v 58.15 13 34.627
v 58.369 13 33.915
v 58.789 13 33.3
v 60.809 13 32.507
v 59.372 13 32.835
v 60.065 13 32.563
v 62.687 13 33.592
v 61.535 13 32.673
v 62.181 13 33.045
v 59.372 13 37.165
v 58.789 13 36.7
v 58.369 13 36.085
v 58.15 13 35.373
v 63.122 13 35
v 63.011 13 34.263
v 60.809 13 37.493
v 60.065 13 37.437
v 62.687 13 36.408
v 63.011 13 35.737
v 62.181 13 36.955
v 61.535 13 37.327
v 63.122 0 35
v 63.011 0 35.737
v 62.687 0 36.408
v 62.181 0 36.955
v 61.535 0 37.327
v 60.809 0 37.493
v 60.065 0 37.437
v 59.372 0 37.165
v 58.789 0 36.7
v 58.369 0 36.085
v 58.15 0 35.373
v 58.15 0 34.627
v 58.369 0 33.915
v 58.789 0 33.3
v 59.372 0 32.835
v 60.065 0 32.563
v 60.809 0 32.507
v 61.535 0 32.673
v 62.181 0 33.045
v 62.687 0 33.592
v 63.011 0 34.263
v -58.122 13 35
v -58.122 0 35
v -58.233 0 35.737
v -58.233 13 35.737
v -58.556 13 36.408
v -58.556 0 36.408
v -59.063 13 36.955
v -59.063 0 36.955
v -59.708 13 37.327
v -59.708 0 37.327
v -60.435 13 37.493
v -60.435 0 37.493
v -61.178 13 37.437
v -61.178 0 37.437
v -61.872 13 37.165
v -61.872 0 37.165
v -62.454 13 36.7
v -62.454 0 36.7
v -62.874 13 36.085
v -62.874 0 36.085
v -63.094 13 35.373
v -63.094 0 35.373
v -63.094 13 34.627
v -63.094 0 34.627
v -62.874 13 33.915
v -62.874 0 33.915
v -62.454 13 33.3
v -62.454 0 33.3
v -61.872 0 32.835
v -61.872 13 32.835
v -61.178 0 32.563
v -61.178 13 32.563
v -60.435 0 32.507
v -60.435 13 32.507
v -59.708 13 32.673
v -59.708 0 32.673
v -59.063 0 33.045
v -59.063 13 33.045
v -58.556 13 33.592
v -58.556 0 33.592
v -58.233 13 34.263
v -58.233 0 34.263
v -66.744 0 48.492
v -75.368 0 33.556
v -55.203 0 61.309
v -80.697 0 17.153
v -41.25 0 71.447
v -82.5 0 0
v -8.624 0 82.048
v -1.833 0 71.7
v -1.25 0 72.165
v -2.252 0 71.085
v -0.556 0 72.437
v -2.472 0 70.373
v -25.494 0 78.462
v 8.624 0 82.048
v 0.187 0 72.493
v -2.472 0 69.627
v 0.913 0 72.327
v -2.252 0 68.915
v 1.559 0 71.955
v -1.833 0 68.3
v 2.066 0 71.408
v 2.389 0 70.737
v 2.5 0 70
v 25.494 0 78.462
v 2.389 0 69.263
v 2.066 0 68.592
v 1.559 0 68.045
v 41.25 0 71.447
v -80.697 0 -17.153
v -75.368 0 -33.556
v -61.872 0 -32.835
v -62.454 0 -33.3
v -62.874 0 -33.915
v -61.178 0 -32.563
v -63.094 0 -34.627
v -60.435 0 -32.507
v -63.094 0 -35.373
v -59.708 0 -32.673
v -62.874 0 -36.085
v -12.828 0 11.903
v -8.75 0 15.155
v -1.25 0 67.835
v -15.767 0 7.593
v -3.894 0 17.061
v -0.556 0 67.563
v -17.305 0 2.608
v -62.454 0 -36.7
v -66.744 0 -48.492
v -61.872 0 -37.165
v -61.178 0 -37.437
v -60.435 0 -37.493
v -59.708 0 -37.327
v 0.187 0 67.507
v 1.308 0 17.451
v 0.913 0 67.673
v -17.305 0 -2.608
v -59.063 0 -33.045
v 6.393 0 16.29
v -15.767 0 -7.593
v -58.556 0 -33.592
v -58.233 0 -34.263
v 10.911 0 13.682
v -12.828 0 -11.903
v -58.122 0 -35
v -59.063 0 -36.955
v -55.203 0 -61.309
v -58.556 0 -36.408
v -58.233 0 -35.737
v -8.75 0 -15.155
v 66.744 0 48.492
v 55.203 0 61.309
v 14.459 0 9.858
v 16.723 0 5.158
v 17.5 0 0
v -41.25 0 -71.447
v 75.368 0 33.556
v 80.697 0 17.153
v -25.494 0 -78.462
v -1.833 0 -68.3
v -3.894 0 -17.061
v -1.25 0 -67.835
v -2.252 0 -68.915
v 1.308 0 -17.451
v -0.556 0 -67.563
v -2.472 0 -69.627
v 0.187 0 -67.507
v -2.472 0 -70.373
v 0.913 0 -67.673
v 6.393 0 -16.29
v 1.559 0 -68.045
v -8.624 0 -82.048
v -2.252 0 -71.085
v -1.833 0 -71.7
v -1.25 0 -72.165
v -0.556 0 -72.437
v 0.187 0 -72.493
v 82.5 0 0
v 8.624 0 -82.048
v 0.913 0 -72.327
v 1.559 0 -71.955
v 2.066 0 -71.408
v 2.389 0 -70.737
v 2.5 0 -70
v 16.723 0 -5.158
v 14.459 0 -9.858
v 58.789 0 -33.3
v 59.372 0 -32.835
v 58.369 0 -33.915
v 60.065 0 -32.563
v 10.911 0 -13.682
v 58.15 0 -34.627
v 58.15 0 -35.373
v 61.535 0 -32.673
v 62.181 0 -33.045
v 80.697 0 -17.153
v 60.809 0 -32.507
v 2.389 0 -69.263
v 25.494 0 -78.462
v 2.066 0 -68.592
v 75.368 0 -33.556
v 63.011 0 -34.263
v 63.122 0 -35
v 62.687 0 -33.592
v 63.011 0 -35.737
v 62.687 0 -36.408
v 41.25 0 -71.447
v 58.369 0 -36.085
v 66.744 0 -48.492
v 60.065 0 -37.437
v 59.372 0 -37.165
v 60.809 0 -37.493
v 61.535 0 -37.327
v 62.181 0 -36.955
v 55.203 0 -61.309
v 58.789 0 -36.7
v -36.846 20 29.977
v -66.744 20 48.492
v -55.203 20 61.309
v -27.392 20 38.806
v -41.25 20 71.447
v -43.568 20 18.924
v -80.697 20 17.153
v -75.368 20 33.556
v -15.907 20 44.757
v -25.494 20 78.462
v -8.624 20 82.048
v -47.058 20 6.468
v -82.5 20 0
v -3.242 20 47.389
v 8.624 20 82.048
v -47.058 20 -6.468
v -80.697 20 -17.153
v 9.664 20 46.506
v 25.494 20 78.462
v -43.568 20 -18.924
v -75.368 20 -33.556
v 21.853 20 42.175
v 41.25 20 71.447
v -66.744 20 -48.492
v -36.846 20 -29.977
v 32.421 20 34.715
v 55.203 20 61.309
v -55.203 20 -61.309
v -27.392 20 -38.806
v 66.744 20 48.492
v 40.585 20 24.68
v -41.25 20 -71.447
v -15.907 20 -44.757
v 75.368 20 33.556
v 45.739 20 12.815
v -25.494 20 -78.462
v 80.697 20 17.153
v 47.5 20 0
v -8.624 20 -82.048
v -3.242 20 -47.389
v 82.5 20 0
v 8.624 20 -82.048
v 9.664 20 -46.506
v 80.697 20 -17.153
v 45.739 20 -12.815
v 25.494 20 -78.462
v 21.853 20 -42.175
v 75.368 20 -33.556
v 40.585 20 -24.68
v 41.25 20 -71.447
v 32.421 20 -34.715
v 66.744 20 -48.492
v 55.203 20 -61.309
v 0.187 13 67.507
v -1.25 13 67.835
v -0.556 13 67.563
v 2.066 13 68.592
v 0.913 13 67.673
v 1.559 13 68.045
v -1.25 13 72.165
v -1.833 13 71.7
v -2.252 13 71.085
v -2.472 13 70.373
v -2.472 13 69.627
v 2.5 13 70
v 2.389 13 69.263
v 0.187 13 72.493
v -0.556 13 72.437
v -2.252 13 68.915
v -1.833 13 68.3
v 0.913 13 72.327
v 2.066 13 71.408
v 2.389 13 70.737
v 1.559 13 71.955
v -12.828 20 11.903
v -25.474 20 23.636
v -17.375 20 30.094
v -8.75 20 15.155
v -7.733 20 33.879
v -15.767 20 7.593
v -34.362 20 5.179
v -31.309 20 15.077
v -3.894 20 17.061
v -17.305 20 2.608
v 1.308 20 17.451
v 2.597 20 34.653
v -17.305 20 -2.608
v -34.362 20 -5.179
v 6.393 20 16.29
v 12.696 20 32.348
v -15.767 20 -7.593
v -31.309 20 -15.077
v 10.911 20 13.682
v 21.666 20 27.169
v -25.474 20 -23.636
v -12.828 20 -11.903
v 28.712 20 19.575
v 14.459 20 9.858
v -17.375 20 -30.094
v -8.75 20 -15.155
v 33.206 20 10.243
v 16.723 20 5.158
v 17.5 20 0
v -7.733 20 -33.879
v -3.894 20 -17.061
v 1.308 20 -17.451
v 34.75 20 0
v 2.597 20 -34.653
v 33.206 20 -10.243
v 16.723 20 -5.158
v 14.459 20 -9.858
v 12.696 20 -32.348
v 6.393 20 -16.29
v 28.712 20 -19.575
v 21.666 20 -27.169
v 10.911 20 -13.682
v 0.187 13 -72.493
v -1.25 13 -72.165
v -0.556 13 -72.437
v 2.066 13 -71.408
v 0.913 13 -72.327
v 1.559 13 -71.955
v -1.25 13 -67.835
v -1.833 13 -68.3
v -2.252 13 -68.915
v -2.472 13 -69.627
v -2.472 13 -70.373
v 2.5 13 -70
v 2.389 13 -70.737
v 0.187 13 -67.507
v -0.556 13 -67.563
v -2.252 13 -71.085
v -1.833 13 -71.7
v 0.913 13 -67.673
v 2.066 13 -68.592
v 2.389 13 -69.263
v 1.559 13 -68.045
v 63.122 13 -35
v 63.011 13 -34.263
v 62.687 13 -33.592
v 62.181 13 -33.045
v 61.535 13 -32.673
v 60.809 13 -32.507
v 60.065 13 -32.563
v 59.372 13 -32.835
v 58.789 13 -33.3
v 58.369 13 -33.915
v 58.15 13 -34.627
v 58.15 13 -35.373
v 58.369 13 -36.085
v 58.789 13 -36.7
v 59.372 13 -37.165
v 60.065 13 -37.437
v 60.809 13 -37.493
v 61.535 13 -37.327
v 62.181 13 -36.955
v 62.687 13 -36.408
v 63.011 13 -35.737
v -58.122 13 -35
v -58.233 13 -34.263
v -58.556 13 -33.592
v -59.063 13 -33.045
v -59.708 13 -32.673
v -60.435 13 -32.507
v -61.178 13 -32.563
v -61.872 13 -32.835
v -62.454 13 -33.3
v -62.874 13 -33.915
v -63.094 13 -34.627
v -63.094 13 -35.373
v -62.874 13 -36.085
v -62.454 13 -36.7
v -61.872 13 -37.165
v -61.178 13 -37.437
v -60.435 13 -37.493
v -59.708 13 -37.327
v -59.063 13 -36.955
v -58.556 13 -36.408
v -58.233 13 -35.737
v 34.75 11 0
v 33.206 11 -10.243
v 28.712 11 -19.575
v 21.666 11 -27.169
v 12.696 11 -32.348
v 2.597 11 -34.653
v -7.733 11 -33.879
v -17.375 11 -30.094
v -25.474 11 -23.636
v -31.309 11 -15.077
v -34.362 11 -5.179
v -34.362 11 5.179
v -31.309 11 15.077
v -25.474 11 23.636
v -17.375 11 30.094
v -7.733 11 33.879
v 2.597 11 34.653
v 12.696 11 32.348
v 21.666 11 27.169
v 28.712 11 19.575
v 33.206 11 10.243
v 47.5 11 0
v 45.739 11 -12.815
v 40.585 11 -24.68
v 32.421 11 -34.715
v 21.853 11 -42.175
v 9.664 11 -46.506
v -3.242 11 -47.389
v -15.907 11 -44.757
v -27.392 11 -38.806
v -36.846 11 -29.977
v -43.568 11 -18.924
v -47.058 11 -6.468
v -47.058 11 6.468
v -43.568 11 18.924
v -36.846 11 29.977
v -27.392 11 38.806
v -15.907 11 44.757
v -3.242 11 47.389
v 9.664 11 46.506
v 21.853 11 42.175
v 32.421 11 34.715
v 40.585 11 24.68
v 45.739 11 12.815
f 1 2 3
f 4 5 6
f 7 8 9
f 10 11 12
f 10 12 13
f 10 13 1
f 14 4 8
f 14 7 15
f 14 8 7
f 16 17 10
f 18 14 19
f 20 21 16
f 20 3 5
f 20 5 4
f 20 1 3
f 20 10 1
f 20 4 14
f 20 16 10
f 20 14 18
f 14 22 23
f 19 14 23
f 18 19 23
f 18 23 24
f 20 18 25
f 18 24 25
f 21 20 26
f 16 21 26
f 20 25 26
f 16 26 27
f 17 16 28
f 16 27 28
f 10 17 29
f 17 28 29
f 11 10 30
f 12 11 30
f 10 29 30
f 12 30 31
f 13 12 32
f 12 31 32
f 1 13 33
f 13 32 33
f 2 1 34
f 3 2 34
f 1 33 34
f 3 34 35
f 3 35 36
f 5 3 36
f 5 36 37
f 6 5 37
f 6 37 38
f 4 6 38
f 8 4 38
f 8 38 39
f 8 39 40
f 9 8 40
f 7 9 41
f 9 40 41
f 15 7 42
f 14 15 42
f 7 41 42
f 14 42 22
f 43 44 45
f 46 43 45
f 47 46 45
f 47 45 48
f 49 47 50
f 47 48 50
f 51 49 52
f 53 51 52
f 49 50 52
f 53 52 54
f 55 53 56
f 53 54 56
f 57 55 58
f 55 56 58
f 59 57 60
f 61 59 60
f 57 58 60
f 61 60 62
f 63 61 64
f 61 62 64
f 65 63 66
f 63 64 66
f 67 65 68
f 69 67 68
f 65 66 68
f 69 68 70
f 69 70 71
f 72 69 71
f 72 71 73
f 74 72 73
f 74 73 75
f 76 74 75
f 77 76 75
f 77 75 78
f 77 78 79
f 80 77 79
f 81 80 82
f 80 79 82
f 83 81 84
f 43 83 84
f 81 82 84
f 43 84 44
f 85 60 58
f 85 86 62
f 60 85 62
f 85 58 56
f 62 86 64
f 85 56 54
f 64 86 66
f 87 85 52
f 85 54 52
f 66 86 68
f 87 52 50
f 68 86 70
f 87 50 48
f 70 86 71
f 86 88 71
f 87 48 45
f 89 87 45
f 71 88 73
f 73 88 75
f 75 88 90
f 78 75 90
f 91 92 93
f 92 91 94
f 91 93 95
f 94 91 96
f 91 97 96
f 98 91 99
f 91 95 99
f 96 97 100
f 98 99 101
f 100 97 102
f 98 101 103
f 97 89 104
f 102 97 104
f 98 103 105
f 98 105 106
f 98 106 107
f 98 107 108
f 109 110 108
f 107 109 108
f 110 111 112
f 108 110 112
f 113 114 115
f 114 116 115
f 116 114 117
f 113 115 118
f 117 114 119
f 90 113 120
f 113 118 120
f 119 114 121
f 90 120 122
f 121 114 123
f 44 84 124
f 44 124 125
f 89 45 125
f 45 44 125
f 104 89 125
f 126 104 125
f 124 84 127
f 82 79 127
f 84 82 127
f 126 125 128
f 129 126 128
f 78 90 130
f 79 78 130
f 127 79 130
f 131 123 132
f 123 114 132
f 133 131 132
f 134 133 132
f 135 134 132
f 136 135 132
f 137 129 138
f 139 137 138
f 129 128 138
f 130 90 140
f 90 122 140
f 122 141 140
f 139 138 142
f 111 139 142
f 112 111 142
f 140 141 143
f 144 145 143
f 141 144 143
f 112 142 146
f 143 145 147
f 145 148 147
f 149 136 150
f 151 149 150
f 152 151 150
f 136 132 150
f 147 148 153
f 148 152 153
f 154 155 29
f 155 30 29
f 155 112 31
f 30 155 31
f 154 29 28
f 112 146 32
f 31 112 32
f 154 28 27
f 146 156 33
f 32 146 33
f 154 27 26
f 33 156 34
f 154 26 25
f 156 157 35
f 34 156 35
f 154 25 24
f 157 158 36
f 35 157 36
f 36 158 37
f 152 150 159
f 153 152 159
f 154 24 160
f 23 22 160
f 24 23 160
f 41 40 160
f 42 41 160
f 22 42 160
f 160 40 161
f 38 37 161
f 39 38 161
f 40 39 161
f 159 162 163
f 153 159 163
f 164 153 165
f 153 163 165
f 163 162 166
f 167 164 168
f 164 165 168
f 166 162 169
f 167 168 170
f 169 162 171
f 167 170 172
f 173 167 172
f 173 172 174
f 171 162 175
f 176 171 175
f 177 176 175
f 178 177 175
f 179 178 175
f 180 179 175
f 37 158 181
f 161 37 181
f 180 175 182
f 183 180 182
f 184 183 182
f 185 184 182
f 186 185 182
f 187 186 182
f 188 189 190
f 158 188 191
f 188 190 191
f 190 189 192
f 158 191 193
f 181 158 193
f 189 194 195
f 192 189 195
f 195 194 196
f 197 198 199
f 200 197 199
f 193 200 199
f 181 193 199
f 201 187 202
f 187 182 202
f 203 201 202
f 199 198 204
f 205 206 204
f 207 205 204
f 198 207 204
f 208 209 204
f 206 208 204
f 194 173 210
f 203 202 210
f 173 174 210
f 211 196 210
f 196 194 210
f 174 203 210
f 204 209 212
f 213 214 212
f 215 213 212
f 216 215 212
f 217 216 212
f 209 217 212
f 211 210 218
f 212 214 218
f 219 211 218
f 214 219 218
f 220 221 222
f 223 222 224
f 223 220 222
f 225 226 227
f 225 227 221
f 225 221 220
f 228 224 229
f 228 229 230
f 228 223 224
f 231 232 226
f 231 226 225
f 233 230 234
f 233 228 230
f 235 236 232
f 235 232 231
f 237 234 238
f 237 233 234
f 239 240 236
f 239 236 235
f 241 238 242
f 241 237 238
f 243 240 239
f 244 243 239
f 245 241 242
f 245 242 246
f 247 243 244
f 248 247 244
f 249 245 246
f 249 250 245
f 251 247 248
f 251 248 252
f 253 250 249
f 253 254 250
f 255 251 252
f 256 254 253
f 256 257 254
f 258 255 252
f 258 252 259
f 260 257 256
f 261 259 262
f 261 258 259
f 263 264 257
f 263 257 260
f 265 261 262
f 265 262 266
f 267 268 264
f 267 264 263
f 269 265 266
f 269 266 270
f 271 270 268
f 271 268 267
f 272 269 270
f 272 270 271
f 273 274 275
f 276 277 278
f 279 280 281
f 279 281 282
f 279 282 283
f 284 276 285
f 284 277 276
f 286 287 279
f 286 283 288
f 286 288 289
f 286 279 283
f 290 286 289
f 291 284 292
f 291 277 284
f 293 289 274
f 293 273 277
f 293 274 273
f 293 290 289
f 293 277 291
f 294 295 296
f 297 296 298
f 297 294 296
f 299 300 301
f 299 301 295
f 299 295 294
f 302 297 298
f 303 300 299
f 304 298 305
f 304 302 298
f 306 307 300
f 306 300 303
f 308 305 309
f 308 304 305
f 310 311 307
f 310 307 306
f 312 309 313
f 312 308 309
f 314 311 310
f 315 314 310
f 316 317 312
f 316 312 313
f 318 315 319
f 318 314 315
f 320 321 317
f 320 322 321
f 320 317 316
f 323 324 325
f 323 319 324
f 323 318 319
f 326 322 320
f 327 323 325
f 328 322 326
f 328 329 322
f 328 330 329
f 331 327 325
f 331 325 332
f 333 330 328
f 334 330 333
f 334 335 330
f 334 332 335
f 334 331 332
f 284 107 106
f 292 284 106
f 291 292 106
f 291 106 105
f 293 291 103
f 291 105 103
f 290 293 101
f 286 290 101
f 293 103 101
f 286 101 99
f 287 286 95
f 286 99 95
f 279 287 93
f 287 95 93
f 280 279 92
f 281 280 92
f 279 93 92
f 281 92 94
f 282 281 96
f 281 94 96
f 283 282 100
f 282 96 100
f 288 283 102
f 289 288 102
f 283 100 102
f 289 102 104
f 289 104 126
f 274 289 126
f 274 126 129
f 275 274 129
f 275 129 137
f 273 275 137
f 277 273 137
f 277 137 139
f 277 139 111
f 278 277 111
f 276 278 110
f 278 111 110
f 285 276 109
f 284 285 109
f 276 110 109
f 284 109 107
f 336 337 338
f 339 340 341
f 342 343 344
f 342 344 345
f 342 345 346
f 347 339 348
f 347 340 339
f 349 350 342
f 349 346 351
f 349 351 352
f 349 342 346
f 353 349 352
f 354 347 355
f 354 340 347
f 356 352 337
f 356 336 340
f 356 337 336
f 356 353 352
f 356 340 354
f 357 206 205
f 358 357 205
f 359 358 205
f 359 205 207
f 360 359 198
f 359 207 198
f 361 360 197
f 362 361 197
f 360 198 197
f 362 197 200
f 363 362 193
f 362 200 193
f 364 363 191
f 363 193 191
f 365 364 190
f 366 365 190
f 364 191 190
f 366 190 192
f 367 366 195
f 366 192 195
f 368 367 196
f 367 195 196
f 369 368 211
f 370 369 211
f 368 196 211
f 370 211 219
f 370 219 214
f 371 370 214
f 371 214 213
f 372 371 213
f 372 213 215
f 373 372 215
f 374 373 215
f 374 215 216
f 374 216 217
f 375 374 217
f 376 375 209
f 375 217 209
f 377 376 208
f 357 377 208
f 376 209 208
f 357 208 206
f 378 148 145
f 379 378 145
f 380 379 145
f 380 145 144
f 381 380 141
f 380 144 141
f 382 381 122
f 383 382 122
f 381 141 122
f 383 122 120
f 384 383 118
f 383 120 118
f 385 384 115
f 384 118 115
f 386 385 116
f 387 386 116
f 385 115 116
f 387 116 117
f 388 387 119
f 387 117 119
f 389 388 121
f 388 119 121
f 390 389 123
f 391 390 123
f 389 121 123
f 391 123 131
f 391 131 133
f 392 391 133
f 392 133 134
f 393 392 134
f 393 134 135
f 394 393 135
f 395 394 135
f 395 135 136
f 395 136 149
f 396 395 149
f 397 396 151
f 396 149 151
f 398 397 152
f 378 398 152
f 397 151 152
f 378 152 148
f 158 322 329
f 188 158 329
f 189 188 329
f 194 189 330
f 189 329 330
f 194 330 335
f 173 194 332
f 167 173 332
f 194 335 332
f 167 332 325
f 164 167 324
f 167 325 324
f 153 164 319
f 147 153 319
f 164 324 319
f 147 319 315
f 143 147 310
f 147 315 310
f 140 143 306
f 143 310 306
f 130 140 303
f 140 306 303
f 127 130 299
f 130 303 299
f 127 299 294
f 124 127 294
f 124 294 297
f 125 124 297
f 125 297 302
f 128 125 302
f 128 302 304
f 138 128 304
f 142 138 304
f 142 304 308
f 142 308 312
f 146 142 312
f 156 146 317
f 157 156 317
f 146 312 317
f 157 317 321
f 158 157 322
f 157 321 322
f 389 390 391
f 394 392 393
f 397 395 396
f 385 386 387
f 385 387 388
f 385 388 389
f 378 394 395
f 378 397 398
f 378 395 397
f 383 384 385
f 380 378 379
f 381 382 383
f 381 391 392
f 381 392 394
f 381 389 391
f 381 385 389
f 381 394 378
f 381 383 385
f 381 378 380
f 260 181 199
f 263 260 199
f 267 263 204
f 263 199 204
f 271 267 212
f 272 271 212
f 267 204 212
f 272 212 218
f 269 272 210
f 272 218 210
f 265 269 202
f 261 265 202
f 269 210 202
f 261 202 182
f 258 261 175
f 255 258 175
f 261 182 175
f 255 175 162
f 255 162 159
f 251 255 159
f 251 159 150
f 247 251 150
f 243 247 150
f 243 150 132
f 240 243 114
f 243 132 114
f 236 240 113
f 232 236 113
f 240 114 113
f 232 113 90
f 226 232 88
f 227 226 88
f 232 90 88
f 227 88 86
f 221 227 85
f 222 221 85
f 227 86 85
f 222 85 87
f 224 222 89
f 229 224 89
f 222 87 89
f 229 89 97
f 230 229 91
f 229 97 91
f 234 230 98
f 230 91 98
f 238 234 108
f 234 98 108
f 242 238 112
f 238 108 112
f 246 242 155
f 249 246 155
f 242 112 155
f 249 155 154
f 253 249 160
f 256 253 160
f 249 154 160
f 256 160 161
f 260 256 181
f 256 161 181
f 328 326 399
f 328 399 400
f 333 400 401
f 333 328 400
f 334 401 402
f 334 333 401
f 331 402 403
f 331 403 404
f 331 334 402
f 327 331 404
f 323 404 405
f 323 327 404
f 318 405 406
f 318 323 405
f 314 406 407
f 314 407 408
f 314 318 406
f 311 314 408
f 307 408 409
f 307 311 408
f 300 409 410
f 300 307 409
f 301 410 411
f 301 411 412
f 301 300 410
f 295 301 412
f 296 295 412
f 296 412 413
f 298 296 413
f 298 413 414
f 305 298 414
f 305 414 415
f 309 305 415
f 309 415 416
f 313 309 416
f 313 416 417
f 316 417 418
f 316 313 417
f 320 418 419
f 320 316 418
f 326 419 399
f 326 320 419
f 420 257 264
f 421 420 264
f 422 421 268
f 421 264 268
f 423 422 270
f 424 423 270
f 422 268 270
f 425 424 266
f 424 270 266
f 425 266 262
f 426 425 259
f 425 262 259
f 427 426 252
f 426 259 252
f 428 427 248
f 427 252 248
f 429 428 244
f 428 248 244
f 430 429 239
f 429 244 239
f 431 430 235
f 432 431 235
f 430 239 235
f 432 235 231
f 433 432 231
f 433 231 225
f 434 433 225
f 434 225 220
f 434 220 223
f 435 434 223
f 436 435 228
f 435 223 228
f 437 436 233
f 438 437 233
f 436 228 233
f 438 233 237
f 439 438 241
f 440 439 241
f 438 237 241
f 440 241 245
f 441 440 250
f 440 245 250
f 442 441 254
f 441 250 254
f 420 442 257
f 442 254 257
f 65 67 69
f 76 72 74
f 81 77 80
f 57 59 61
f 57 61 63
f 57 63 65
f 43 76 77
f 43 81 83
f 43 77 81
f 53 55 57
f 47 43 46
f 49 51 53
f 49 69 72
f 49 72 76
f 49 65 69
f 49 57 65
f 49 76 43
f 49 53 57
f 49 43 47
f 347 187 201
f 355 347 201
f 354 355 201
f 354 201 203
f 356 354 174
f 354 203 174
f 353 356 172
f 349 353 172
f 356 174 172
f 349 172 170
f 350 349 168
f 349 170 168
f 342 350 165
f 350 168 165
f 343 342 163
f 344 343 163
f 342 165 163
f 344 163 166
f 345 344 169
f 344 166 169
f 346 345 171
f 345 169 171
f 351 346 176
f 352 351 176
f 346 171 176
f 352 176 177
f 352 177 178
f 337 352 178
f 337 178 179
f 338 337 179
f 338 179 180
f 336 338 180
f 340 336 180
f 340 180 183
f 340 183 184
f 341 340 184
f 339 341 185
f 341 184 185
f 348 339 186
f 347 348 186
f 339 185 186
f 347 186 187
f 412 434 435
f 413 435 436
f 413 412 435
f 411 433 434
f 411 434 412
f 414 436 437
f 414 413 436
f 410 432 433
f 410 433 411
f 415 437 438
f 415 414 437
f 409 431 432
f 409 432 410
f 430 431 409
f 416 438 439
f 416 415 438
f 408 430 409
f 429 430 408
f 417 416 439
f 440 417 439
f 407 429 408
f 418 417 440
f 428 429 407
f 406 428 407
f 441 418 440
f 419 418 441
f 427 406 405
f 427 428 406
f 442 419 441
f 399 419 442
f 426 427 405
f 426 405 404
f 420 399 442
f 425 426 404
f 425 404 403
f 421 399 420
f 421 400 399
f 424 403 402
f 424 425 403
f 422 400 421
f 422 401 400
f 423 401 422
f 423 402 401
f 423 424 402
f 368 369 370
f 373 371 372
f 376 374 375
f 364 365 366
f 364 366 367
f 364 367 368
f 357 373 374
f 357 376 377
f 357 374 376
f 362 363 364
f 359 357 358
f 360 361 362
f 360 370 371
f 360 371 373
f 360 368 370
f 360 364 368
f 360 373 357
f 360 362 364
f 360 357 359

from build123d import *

# Parameters (mm, degrees)
SKETCH1_R           = 82.5
BOSS_EXTRUDE1_DEPTH = 20
SKETCH2_R           = 17.5
CUT_EXTRUDE1_DEPTH  = 20
SKETCH3_R           = 47.5
SKETCH3_R_2         = 34.75
CUT_EXTRUDE2_DEPTH  = 9
SKETCH4_R           = 2.5
CUT_EXTRUDE3_DEPTH  = 13


with BuildPart() as part:
    # Sketch1 → Boss-Extrude1 (new body)
    with BuildSketch(Plane(origin=(0, 0, 0), x_dir=(1, 0, 0), z_dir=(0, 1, 0))):
        Circle(SKETCH1_R)
    extrude(amount=BOSS_EXTRUDE1_DEPTH)

    # Sketch2 → Cut-Extrude1 (cut)
    with BuildSketch(Plane(origin=(0, 20, 0), x_dir=(1, 0, 0), z_dir=(0, 1, 0))):
        Circle(SKETCH2_R)
    extrude(amount=-CUT_EXTRUDE1_DEPTH, mode=Mode.SUBTRACT)

    # Sketch3 → Cut-Extrude2 (cut)
    with BuildSketch(Plane(origin=(0, 20, 0), x_dir=(1, 0, 0), z_dir=(0, 1, 0))):
        Circle(SKETCH3_R)
        Circle(SKETCH3_R_2, mode=Mode.SUBTRACT)
    extrude(amount=-CUT_EXTRUDE2_DEPTH, mode=Mode.SUBTRACT)

    # Sketch4 → Cut-Extrude3 (cut)
    with BuildSketch(Plane.XZ):
        with Locations((0, 70)):
            Circle(SKETCH4_R)
        with Locations((60.621778265, 35)):
            Circle(SKETCH4_R)
        with Locations((60.621778265, -35)):
            Circle(SKETCH4_R)
        with Locations((0, -70)):
            Circle(SKETCH4_R)
        with Locations((-60.621778265, -35)):
            Circle(SKETCH4_R)
        with Locations((-60.621778265, 35)):
            Circle(SKETCH4_R)
    extrude(amount=-CUT_EXTRUDE3_DEPTH, mode=Mode.SUBTRACT)


solid = part.part
